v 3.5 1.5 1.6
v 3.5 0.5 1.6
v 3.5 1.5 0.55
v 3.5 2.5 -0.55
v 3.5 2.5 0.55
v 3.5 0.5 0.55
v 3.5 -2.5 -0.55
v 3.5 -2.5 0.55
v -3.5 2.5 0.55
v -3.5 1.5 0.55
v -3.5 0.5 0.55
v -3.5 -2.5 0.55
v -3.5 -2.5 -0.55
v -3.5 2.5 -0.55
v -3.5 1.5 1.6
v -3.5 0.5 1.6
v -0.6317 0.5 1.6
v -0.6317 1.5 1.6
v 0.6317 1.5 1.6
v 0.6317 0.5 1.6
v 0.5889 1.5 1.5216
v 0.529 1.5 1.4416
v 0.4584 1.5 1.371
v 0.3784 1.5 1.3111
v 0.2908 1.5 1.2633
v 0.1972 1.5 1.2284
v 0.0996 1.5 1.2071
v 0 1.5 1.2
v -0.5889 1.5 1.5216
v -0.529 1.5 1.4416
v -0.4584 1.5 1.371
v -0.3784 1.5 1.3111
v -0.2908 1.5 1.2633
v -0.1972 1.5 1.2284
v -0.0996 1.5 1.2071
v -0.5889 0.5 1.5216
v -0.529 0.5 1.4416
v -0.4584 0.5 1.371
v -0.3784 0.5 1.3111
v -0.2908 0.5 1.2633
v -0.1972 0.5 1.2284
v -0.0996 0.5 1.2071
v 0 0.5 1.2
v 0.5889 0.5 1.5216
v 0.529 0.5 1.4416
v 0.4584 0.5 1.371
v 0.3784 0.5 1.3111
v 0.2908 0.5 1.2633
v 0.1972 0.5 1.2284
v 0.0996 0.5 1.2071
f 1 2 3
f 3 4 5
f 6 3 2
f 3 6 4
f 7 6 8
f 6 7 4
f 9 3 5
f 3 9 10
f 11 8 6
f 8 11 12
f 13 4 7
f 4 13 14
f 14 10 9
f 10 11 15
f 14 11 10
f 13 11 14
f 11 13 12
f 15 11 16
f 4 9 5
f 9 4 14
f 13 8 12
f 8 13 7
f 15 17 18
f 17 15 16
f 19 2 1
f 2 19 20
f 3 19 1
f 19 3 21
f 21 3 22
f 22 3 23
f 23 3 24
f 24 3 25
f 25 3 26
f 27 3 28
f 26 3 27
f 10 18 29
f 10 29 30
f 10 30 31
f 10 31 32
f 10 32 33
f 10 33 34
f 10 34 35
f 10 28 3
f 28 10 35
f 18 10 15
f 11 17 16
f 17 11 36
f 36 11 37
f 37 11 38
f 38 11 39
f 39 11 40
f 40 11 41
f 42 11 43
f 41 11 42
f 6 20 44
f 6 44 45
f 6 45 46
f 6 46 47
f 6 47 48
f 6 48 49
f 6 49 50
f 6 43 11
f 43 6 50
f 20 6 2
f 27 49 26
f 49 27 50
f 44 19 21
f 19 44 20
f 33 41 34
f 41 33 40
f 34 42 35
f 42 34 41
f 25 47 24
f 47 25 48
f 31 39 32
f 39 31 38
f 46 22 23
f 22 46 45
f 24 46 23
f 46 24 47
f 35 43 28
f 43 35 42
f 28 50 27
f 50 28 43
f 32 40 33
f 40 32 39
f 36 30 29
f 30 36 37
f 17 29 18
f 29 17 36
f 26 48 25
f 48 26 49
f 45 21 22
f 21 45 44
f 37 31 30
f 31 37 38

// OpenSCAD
// CSG-modules.scad - Basic usage of modules, if, color, $fs/$fa

// Global resolution
$fs = 0.1;  // Don't generate smaller facets than 0.1 mm
$fa = 5;    // Don't generate larger angles than 5 degrees

difference() {
    union(){
        base();
        back();
    }
    notch();
}
module base() {
    color("Orange") cube([7,5,1.1], center=true);
    }
    
module back() {
    color("Purple") translate([0,1,.6]) cube([7,1,2], center=true);
    }    
    
module notch() {
    color("White") translate([0,1,1.9]) rotate([90,0,0]) cylinder(h=2, r=.7, center=true);
    }    
